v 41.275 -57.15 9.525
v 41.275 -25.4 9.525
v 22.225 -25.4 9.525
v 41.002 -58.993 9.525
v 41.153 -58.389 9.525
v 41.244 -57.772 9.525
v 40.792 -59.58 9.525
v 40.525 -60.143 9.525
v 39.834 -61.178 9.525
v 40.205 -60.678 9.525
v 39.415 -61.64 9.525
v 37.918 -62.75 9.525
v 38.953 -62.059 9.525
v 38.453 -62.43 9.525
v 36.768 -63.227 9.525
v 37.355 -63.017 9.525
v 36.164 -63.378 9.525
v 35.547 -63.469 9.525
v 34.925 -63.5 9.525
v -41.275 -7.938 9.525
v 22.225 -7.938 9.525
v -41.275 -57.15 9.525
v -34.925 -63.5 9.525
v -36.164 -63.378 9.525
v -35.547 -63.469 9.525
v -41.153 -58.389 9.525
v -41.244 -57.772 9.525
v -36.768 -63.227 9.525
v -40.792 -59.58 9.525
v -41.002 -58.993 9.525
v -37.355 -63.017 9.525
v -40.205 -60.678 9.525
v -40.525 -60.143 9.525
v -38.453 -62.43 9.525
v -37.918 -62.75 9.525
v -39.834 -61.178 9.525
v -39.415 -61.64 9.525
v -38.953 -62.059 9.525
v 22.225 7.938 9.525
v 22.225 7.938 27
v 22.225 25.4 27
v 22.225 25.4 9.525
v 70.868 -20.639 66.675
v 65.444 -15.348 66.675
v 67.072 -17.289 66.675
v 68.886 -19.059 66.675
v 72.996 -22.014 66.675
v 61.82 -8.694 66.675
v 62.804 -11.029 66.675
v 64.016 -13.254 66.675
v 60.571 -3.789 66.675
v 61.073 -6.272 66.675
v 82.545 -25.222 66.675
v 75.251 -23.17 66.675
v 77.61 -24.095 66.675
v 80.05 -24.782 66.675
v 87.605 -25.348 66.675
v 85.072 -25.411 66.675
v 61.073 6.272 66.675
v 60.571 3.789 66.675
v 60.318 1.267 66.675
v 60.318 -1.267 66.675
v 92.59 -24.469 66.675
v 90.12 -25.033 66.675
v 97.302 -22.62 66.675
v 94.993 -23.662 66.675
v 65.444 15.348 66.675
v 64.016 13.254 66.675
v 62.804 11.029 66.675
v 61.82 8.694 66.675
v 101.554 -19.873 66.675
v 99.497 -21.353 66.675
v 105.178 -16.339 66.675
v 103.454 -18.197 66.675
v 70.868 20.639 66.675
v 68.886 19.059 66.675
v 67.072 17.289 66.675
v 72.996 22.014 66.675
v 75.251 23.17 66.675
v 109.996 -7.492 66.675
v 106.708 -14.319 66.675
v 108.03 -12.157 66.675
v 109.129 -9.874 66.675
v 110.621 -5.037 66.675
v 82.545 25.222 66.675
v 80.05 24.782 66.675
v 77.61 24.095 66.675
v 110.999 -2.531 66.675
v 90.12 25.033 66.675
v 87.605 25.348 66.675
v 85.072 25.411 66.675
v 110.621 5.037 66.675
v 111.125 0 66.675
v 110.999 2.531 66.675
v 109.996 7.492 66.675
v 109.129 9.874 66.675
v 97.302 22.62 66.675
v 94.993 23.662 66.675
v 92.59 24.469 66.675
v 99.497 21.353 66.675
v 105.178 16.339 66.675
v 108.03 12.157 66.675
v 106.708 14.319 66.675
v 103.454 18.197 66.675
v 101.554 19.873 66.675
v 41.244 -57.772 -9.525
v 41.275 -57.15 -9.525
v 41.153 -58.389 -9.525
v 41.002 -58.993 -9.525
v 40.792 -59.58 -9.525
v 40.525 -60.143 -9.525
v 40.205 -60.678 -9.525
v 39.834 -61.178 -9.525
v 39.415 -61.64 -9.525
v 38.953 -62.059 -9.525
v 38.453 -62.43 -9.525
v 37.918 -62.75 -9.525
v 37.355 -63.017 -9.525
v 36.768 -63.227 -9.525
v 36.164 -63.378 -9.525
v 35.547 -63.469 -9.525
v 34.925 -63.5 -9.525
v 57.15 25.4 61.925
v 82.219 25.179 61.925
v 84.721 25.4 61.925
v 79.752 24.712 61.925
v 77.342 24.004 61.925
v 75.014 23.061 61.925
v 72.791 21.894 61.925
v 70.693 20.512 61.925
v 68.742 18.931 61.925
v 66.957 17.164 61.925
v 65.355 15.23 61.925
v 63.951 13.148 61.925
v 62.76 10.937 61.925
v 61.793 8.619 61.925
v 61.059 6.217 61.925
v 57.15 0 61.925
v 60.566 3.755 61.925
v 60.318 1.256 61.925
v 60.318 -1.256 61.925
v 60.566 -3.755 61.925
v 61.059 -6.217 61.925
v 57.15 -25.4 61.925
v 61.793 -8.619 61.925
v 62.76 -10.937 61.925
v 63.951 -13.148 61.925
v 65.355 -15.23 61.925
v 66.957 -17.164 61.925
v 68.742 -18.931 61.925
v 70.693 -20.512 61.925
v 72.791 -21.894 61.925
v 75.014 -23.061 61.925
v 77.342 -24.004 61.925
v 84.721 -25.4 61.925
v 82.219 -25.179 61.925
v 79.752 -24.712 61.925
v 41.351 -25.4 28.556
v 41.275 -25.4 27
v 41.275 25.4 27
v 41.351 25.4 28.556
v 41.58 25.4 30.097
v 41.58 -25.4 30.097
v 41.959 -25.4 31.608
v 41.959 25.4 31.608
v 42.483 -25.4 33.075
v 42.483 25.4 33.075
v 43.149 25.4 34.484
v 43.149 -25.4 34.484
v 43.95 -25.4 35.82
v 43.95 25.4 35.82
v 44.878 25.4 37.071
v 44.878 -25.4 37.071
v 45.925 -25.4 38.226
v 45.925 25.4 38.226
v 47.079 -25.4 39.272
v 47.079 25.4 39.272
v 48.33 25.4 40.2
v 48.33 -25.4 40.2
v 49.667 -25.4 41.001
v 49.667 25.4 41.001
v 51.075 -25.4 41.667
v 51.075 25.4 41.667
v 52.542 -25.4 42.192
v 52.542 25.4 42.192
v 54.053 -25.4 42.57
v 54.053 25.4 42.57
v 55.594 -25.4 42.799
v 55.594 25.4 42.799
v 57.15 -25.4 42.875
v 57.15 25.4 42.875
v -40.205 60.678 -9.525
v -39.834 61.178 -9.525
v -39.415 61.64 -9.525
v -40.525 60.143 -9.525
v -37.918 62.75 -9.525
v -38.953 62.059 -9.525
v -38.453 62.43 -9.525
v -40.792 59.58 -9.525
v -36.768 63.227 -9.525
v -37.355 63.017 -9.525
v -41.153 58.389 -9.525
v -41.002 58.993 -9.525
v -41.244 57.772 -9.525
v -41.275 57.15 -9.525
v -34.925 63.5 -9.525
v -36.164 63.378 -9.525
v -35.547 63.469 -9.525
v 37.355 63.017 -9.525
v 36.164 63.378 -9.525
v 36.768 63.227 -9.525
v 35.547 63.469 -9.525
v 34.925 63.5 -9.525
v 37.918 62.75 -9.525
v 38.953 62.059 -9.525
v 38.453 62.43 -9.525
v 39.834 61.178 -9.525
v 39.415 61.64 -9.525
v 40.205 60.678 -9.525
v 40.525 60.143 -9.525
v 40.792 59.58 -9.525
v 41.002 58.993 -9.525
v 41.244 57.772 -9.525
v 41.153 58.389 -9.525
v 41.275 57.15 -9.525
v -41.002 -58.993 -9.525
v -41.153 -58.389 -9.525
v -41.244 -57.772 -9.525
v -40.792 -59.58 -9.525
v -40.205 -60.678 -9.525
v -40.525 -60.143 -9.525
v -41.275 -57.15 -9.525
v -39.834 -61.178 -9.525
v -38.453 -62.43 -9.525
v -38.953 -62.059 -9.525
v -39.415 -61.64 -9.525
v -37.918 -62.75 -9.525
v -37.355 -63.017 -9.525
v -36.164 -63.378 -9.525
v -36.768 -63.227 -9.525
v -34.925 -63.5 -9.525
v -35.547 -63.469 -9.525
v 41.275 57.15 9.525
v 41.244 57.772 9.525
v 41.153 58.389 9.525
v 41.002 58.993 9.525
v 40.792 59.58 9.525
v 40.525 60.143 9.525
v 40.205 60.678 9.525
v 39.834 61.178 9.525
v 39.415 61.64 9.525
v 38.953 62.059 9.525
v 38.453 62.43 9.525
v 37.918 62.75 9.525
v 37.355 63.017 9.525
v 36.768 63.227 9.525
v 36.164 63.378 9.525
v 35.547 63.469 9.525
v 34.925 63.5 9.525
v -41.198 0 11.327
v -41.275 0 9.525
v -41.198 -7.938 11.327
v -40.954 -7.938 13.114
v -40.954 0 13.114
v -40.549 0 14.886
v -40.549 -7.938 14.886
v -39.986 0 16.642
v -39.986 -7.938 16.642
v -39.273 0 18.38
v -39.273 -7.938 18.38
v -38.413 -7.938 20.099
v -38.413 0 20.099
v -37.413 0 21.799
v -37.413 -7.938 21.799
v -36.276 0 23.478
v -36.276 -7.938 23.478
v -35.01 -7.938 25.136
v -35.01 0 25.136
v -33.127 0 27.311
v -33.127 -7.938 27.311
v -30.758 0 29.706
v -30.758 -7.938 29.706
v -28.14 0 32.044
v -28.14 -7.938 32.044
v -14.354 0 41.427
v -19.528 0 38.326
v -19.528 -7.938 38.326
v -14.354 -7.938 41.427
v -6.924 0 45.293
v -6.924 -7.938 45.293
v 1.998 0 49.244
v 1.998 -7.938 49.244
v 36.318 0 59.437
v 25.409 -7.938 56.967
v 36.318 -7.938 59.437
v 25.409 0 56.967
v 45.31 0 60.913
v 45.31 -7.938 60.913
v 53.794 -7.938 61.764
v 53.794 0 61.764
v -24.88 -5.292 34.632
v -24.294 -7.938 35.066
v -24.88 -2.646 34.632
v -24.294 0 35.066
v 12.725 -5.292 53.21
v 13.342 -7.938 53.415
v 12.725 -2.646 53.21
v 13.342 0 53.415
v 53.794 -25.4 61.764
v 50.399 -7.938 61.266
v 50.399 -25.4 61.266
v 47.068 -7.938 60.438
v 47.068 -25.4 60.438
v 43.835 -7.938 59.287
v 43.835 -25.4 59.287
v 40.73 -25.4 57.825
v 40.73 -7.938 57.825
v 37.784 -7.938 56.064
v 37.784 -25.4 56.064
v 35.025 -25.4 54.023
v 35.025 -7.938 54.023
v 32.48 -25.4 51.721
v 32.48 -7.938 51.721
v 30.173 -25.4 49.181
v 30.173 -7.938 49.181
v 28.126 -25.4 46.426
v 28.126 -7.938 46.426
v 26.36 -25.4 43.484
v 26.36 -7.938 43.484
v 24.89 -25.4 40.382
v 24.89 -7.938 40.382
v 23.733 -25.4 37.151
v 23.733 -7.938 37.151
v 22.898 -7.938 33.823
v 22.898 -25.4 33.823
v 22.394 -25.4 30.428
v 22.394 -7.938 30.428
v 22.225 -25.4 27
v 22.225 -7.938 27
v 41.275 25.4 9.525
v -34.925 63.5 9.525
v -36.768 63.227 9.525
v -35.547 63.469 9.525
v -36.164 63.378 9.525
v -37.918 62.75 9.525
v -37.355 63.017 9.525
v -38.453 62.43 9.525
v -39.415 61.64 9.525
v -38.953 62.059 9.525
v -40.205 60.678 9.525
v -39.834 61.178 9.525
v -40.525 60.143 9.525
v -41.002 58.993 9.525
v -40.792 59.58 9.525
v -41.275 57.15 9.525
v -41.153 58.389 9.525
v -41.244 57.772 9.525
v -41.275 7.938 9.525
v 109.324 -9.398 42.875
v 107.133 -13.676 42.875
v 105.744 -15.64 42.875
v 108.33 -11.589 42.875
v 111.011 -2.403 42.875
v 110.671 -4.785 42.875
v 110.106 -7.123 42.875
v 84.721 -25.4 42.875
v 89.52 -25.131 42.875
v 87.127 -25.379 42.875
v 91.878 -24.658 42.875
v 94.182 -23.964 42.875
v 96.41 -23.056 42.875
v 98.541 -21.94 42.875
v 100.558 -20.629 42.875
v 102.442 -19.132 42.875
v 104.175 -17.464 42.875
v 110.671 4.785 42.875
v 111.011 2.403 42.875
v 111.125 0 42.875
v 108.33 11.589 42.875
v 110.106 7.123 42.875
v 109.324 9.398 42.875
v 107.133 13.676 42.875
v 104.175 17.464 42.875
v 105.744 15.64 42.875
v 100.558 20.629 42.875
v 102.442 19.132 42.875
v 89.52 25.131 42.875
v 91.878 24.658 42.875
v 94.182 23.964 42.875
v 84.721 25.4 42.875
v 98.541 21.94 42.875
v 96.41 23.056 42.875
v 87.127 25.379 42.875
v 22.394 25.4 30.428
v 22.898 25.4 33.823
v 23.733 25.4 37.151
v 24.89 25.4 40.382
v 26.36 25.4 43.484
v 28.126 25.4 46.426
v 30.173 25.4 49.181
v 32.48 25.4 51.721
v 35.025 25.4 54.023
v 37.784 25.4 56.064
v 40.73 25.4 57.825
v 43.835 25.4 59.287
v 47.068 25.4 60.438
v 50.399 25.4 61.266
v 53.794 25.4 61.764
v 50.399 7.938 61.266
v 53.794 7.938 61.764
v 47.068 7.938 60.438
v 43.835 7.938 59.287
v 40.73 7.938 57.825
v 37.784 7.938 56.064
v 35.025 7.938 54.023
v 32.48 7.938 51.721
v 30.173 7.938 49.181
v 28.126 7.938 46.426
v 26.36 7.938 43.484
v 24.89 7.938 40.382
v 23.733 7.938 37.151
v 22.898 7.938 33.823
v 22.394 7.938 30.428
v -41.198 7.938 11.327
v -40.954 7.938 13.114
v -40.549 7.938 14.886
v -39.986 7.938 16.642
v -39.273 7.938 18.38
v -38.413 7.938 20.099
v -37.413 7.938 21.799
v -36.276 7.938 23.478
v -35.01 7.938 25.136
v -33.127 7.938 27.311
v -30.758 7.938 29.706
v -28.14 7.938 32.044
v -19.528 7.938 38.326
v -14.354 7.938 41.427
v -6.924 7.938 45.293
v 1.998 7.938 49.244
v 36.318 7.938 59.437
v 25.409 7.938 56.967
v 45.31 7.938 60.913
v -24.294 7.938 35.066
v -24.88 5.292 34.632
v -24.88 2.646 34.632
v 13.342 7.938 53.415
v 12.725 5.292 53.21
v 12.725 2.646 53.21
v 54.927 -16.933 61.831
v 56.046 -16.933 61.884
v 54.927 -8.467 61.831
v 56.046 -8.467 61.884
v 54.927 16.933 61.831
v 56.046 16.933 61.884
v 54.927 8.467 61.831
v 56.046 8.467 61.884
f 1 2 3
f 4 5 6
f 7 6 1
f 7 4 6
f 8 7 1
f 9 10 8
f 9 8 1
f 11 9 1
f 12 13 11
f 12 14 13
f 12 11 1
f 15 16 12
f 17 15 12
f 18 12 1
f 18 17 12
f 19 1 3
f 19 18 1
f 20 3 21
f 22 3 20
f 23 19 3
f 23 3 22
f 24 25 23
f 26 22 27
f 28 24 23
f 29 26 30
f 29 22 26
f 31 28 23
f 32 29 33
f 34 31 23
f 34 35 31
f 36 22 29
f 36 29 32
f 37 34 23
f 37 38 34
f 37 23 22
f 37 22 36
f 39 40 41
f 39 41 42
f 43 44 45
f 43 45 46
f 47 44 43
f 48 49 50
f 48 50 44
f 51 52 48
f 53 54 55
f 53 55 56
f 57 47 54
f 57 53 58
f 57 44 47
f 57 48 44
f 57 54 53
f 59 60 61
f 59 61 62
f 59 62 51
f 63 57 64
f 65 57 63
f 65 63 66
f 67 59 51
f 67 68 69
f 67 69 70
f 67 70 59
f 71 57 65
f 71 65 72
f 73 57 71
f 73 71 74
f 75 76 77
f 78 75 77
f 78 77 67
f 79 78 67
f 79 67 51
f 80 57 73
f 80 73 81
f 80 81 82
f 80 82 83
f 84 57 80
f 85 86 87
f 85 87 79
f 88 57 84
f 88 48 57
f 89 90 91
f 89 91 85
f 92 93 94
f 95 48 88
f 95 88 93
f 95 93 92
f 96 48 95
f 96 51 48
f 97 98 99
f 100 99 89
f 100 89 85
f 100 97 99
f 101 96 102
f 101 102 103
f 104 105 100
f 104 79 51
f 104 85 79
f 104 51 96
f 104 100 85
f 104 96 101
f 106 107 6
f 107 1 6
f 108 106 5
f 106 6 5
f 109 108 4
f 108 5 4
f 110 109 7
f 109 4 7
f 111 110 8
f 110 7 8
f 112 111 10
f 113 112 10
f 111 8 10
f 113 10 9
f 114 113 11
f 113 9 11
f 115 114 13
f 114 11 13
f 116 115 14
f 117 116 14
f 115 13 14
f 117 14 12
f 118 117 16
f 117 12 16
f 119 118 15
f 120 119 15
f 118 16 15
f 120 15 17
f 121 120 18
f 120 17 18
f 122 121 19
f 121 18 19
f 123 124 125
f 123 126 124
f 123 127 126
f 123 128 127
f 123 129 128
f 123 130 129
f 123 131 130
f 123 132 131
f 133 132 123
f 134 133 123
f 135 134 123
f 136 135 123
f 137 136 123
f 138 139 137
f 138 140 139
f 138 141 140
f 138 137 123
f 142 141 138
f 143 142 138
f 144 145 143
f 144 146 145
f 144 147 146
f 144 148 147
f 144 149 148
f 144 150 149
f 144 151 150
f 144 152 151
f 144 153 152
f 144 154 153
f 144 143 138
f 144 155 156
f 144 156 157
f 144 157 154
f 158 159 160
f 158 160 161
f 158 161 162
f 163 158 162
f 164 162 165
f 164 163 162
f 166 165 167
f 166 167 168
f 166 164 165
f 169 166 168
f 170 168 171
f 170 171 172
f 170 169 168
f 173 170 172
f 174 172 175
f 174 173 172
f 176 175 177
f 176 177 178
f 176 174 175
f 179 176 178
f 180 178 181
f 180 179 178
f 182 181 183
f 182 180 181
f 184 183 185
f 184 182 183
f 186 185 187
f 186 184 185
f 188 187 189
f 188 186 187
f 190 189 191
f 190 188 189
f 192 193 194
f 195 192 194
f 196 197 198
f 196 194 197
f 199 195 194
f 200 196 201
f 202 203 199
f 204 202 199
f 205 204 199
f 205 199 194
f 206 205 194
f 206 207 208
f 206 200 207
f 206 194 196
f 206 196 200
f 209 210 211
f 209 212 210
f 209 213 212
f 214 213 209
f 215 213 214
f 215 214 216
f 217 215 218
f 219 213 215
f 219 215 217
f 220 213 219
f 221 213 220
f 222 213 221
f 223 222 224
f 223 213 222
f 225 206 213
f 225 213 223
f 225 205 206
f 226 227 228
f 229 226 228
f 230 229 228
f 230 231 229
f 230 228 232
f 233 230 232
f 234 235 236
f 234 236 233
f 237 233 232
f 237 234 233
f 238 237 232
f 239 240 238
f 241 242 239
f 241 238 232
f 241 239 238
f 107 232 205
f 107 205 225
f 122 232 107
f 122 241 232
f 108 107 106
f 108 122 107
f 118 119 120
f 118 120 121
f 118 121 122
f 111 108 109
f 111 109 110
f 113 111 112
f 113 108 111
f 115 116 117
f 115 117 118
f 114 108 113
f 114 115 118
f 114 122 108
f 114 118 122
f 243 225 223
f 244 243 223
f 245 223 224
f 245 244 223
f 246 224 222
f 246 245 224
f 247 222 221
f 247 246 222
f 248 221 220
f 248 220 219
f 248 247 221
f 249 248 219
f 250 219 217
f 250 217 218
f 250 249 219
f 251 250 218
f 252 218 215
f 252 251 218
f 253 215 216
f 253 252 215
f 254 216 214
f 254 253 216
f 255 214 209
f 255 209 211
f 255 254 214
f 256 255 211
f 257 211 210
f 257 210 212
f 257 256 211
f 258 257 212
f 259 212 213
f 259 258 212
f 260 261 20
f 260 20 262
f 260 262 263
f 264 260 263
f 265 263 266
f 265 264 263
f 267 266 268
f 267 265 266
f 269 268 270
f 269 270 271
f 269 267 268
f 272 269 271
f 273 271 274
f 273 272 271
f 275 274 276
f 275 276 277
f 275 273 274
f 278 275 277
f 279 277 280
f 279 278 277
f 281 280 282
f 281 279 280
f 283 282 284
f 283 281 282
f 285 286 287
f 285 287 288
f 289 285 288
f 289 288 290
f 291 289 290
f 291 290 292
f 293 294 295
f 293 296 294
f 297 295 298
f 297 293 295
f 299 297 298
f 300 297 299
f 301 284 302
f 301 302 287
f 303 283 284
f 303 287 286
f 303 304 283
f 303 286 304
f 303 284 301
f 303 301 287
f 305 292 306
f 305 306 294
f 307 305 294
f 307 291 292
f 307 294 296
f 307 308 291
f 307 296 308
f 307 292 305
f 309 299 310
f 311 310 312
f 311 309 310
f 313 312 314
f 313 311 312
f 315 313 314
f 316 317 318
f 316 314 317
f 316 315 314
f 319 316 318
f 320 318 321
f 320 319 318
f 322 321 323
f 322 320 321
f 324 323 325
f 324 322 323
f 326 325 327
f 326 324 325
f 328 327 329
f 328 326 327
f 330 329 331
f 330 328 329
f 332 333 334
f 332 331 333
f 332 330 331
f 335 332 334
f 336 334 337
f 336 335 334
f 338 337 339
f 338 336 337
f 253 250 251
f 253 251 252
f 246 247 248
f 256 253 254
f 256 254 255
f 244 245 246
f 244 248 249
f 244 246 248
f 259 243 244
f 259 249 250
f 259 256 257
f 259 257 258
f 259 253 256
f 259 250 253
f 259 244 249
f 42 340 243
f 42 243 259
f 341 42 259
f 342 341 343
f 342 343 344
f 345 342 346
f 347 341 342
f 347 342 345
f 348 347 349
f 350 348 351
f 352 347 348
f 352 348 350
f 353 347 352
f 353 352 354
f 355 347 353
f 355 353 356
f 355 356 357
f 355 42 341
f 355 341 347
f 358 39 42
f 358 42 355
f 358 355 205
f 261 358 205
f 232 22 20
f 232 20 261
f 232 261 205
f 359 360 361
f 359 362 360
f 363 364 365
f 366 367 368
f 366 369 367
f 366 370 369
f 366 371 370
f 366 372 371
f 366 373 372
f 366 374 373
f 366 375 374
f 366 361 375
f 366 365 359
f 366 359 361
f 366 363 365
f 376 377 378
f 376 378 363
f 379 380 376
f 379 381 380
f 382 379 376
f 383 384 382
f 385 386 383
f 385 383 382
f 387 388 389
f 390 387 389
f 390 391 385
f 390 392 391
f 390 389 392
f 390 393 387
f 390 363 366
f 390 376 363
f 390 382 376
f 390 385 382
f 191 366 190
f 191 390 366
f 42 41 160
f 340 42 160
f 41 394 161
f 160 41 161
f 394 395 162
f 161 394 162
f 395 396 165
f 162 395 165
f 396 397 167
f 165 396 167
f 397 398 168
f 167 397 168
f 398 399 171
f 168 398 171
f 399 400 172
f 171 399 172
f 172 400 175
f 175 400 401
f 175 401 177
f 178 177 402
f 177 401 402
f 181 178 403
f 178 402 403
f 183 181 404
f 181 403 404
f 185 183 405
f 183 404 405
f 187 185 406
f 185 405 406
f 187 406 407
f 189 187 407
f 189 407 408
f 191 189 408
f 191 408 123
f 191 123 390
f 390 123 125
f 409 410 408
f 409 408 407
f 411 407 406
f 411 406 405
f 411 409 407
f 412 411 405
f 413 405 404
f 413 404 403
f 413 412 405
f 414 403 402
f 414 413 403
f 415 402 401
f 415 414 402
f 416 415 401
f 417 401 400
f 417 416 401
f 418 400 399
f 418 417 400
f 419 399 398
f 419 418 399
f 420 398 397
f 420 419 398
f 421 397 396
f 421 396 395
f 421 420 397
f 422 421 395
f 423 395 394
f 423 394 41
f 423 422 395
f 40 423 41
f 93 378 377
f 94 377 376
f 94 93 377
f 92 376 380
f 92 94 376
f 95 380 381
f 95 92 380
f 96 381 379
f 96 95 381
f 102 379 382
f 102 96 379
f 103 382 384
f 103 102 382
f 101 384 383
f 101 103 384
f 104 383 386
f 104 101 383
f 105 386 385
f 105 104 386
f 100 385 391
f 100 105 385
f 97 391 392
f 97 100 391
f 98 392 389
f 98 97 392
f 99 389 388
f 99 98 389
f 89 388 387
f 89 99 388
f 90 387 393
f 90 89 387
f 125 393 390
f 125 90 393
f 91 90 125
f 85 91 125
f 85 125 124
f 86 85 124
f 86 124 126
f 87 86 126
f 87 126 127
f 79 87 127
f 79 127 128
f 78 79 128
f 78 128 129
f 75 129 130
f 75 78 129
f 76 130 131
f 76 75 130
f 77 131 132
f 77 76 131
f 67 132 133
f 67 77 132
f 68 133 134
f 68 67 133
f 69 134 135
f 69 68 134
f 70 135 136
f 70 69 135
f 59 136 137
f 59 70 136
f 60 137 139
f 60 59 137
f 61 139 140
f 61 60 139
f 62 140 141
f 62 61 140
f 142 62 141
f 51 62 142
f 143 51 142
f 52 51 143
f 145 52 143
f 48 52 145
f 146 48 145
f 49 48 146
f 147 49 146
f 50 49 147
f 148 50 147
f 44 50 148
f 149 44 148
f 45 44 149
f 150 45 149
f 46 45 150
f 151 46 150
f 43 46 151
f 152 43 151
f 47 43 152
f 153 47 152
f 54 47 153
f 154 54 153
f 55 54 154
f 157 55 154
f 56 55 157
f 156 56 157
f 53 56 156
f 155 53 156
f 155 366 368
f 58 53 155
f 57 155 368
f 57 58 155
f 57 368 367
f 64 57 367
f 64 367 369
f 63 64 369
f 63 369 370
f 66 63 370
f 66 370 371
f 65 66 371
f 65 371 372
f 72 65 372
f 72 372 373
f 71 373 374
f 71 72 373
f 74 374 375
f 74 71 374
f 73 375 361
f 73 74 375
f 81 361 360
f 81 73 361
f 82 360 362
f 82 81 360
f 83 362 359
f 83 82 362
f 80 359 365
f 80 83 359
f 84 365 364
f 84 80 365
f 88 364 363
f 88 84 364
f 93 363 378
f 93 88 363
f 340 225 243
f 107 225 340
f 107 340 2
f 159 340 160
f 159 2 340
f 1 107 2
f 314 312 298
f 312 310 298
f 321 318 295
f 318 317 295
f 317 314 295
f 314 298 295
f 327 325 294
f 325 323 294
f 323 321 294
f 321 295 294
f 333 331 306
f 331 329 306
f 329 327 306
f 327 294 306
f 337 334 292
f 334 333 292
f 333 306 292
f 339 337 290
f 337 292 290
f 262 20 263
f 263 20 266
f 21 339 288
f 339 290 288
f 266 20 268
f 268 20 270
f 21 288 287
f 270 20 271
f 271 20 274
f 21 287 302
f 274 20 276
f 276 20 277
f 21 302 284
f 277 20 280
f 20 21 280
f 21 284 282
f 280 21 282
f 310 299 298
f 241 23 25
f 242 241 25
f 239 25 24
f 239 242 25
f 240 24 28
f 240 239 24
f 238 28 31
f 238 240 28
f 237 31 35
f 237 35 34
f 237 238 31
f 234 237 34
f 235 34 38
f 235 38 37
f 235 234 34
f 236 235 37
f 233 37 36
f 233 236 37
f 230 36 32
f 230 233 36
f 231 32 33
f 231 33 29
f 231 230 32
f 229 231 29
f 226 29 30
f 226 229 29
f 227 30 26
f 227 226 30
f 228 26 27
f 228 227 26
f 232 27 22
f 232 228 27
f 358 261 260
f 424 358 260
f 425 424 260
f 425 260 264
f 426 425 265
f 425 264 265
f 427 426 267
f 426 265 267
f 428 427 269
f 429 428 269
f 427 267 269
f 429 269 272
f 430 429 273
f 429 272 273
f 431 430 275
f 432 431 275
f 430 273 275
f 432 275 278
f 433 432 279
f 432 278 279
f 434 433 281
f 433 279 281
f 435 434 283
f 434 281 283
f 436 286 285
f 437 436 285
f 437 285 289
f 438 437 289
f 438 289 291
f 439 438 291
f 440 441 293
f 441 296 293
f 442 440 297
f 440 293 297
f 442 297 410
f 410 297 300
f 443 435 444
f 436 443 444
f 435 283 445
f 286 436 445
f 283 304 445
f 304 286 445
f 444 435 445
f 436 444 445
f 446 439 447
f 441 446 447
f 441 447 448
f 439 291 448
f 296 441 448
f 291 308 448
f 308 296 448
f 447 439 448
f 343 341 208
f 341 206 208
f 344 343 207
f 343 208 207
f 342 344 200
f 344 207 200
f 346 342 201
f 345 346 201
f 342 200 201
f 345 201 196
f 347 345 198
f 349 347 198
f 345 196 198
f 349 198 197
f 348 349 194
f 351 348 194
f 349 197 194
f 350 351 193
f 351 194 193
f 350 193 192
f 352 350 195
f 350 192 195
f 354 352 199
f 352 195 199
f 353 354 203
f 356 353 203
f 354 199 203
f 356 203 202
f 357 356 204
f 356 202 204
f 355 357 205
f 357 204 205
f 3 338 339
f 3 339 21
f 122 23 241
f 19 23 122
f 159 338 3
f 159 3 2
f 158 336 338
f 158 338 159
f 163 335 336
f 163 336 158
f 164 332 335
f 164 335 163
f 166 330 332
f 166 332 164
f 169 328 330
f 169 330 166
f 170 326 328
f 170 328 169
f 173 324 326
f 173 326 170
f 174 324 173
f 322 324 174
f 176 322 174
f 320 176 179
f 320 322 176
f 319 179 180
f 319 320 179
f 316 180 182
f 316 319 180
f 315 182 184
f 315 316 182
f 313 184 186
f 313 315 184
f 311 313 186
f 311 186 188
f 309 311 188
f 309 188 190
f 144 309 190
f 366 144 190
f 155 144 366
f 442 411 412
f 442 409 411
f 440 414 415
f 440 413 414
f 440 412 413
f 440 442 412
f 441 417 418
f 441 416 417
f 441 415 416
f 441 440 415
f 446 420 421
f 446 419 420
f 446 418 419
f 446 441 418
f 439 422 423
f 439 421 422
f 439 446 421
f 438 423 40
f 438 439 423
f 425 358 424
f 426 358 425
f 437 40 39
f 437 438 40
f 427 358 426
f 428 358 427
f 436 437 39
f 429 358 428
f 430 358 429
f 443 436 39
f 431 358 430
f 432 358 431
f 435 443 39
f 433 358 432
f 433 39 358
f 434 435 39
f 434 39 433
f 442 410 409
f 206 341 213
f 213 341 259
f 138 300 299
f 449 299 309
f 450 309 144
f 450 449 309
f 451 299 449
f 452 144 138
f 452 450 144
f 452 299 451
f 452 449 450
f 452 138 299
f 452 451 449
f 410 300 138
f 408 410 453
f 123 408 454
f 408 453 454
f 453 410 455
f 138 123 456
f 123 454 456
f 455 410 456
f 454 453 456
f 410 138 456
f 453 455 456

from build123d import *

# Parameters (mm, degrees)
F0_W     = 25.3809136033
F0_H     = 19.05
F1_DEPTH = 25.4
F2_DEPTH = 63.5
F3_DEPTH = 7.9375
F5_R     = 6.35


with BuildPart() as f1:
    # F0 (on Front) → F1 (new body, symmetric)
    with BuildSketch(Plane.XZ):
        with BuildLine():
            Line((22.225, 9.525), (41.275, 9.525))
            Line((41.275, 9.525), (41.275, 27.0002))
            ThreePointArc((41.275, 27.0002), (45.9246798487, 38.2255201513), (57.15, 42.8752))
            Line((57.15, 42.8752), (60.325, 42.8752))
            Line((60.325, 42.8752), (60.325, 61.9252))
            Line((60.325, 61.9252), (57.15, 61.9252))
            add(Edge.make_bspline(
                [(53.7943262834, 61.7636158119), (54.934127265, 61.8370008036), (56.0534706406, 61.8910169909), (57.15, 61.9252)],
                knots=[108.1621965606, 108.1621965606, 108.1621965606, 108.1621965606, 111.5045361635, 111.5045361635, 111.5045361635, 111.5045361635], degree=3))
            ThreePointArc((53.7943262834, 61.7636158119), (31.2950920563, 50.4795390074), (22.225, 27.0002))
            Line((22.225, 27.0002), (22.225, 9.525))
        make_face()
        with Locations((73.0154568017, 52.4002)):
            Rectangle(F0_W, F0_H)
    extrude(amount=F1_DEPTH, both=True)

    # F0 (on Front) → F2 (join, symmetric)
    with BuildSketch(Plane.XZ):
        Polygon((-41.275, 9.525), (-41.275, -9.525), (41.275, -9.525), (41.275, 9.525), (22.225, 9.525), align=None)
    extrude(amount=F2_DEPTH, both=True)

    # F0 (on Front) → F3 (join, symmetric)
    with BuildSketch(Plane.XZ):
        with BuildLine():
            add(Edge.make_bspline(
                [(-41.275, 9.525), (-41.4005826971, 36.730003512), (16.9089727739, 59.3887877429), (53.7943262834, 61.7636158119)],
                knots=[0, 0, 0, 0, 108.1621965606, 108.1621965606, 108.1621965606, 108.1621965606], degree=3))
            Line((-41.275, 9.525), (22.225, 9.525))
            Line((22.225, 9.525), (22.225, 27.0002))
            ThreePointArc((22.225, 27.0002), (31.2950920563, 50.4795390074), (53.7943262834, 61.7636158119))
        make_face()
    extrude(amount=F3_DEPTH, both=True)

    # F0 (on Front) → F4 (revolve)
    with BuildSketch(Plane.XZ):
        Polygon((85.7059136033, 66.675), (85.7059136033, 61.9252), (85.7059136033, 42.8752), (111.125, 42.8752), (111.125, 66.675), align=None)
    revolve(axis=Axis((85.7059136033, 0, 54.7751), (0, 0, 1)))

    # F5
    f5_edges = [f1.edges().sort_by_distance(p)[0] for p in [
        (41.275, -63.5, 0),
        (-41.275, -63.5, 0),
        (41.275, 63.5, 0),
        (-41.275, 63.5, 0),
    ]]
    fillet(f5_edges, radius=F5_R)


solid = f1.part
